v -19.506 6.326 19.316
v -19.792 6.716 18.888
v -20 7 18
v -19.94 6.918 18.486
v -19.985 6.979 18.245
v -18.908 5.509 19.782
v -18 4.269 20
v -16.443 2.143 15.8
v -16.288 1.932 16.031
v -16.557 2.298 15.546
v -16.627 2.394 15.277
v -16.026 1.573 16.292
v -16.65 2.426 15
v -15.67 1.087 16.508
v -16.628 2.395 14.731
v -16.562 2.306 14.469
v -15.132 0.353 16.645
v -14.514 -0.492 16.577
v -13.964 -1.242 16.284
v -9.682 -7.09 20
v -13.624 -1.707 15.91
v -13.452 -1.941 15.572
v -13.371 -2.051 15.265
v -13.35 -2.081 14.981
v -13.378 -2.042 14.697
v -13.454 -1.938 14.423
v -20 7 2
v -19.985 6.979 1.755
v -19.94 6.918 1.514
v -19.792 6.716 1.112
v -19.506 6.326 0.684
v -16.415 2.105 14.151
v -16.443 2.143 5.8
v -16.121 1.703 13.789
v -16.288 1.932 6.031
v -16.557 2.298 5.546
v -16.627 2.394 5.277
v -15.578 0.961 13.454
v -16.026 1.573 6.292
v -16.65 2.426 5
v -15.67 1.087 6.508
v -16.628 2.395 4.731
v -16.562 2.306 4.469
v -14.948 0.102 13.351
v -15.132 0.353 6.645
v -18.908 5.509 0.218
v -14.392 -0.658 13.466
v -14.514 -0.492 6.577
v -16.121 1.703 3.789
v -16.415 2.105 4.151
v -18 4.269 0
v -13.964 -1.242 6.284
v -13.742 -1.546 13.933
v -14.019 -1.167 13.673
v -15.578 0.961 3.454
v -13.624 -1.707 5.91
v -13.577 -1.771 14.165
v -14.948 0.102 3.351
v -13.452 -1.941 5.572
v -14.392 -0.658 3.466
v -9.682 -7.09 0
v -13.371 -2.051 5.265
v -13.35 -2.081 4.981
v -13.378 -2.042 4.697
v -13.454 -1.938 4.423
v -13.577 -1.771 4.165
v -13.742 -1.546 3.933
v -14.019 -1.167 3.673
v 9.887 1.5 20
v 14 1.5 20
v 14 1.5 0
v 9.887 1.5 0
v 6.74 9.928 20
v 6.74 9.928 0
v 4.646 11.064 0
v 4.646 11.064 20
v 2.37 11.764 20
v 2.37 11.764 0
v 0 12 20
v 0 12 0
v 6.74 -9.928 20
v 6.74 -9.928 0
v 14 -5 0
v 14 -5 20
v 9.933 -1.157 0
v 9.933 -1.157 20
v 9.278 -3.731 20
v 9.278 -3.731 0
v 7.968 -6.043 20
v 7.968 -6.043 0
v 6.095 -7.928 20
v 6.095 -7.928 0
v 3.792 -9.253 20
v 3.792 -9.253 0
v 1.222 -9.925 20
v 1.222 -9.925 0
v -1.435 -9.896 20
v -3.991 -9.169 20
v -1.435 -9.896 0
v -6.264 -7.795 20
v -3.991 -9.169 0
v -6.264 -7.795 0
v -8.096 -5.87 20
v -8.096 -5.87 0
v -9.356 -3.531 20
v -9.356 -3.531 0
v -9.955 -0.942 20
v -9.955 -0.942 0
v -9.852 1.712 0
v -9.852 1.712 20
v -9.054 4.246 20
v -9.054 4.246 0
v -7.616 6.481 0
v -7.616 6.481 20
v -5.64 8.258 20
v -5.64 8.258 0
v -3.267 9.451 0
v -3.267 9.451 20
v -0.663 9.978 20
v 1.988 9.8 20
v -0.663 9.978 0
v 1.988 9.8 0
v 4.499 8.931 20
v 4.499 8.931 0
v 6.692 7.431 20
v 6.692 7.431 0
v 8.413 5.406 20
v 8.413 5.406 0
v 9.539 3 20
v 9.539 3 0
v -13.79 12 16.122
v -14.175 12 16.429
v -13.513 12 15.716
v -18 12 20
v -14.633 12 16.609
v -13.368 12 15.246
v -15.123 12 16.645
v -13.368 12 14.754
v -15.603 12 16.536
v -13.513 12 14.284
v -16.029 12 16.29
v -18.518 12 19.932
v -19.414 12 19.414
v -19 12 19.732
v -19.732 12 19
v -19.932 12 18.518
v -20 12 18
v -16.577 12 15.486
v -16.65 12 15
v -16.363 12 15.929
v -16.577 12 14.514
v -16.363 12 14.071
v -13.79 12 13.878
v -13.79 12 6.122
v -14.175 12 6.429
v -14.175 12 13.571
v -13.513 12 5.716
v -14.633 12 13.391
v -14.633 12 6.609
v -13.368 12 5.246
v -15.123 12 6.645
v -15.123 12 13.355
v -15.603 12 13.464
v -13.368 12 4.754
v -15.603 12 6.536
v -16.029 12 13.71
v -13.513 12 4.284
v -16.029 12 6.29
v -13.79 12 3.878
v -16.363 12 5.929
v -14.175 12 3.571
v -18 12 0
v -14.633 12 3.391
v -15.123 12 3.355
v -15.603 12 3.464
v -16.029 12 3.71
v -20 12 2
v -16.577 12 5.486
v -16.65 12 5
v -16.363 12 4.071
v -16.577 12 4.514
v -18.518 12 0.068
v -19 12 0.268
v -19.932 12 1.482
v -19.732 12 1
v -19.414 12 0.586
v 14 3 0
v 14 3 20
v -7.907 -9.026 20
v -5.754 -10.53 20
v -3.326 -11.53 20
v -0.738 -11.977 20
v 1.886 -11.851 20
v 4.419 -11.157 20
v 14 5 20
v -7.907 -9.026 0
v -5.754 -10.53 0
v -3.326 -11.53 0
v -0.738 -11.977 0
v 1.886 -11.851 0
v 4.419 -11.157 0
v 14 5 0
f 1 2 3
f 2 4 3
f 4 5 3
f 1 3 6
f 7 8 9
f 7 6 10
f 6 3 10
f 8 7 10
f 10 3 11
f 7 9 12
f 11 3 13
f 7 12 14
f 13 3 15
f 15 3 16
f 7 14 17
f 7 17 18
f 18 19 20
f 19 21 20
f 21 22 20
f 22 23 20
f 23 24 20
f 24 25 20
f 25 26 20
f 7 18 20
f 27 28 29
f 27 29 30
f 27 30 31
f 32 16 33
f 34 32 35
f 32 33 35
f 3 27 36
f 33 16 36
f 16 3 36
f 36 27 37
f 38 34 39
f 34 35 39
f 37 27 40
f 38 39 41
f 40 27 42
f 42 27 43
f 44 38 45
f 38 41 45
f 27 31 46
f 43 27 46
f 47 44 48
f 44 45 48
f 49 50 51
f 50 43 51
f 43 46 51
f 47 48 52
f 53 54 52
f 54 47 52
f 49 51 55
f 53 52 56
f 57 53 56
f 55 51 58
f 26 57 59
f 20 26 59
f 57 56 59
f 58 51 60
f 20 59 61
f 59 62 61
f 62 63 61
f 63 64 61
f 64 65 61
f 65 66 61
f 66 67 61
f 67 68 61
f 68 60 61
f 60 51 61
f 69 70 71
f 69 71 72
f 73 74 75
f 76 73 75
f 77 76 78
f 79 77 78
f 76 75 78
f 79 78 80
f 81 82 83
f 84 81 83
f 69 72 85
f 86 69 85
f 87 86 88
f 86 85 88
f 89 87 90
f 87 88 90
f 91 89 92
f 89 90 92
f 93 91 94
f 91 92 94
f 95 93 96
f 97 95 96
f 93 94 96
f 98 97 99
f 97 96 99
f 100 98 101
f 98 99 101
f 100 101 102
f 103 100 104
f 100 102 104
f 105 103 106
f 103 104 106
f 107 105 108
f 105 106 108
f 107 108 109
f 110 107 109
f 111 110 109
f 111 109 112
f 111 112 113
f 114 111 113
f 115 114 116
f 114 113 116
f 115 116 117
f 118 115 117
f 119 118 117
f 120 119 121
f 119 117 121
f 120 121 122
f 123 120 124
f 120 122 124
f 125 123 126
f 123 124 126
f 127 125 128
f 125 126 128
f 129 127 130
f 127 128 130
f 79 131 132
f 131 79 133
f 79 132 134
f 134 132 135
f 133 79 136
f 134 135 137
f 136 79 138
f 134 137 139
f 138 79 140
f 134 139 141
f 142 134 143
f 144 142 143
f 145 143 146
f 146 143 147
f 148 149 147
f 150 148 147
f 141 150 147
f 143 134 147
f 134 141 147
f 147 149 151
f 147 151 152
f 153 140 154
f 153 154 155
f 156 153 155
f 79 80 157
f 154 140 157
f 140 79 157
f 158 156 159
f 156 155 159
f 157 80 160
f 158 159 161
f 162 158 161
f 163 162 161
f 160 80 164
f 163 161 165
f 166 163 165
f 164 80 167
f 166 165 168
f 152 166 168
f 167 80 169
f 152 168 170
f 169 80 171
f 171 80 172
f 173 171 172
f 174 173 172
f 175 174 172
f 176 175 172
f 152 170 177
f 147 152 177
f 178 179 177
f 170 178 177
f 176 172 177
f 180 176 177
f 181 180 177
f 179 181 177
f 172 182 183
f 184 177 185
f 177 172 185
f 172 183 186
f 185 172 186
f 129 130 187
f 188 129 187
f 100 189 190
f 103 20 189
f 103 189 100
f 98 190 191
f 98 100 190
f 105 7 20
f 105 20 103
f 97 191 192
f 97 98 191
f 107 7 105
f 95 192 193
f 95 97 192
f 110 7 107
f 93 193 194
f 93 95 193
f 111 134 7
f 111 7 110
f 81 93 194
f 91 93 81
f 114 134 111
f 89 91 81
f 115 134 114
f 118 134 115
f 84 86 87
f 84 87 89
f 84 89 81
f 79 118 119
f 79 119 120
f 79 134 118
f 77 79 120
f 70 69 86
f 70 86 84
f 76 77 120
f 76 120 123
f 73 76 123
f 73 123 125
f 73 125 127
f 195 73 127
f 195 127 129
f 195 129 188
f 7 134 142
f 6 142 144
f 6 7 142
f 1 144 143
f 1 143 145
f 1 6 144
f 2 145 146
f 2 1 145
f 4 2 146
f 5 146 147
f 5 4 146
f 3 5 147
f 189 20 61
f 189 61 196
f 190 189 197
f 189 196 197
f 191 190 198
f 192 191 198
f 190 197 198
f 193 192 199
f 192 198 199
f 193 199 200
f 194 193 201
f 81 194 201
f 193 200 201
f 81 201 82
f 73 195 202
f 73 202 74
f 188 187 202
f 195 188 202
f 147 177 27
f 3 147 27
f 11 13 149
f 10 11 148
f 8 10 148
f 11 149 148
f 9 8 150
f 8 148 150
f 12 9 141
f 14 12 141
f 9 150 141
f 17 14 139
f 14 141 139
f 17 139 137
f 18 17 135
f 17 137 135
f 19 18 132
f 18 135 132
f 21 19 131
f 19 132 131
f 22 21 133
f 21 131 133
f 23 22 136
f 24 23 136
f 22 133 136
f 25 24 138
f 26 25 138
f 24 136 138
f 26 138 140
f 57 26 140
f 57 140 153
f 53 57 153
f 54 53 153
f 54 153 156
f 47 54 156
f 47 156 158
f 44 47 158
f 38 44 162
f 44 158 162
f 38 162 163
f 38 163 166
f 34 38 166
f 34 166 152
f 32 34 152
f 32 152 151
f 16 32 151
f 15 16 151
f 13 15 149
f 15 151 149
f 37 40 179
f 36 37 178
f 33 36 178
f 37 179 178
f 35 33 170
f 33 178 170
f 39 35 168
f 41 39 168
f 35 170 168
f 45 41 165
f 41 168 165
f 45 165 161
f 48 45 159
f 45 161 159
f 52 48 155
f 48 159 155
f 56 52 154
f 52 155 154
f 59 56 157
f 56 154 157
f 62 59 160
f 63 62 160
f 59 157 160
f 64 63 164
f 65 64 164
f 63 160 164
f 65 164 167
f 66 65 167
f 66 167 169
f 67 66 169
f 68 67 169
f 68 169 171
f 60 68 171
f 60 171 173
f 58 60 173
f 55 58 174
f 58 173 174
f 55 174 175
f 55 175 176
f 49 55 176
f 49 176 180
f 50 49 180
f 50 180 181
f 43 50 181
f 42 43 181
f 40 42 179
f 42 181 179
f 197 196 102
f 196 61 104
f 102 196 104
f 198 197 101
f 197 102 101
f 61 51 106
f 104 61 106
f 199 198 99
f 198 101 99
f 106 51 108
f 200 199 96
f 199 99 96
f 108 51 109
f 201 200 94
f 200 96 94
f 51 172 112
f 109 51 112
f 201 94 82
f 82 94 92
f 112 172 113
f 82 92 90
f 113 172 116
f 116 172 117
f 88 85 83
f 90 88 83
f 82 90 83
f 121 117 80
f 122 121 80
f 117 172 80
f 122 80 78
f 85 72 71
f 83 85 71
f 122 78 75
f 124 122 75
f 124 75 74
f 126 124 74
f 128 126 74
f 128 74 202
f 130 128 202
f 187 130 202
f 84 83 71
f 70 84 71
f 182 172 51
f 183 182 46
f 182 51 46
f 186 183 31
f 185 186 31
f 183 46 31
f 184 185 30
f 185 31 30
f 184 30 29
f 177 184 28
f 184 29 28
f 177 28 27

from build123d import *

# Parameters (mm, degrees)
BOSS_EXTRU_1_DEPTH      = 20
BOSS_EXTRU_2_START      = -20
BOSS_EXTRU_2_DEPTH      = 20
ESQUISSE3_R             = 1.65
ENL_V_MAT_EXTRU_1_DEPTH = 38.094473982
CONG_1_R                = 2


with BuildPart() as part:
    # Esquisse1 → Boss.-Extru.1 (new body)
    with BuildSketch(Plane.XY):
        with BuildLine():
            Line((6.739828673, -9.928479715), (14, -5))
            Line((14, -5), (14, 1.5))
            Line((14, 1.5), (9.886859967, 1.5))
            ThreePointArc((9.886859967, 1.5), (-9.742038622, -2.256697475), (9.539392014, 3))
            Line((9.539392014, 3), (14, 3))
            Line((14, 3), (14, 5))
            Line((14, 5), (6.739828673, 9.928479715))
            ThreePointArc((6.739828673, 9.928479715), (-12, 0), (6.739828673, -9.928479715))
        make_face()
    extrude(amount=BOSS_EXTRU_1_DEPTH)

    # Esquisse2 → Boss.-Extru.2 (add)
    with BuildSketch(Plane.XY.offset(20).offset(BOSS_EXTRU_2_START)):
        with BuildLine():
            Line((0, 12), (-20, 12))
            Line((-20, 12), (-20, 7))
            Line((-20, 7), (-9.681507645, -7.090021842))
            ThreePointArc((-9.681507645, -7.090021842), (-10.702342316, 5.427694625), (0, 12))
        make_face()
    extrude(amount=BOSS_EXTRU_2_DEPTH)

    # Esquisse3 → Enlèv. mat.-Extru.1 (cut, through all)
    with BuildSketch(Plane(origin=(0, 12, 0), x_dir=(1, 0, 0), z_dir=(0, 1, 0))):
        with Locations(Location((-15, -5, 0), (0, 0, 180))):
            Circle(ESQUISSE3_R)
        with Locations(Location((-15, -15, 0), (0, 0, 180))):
            Circle(ESQUISSE3_R)
    extrude(amount=-ENL_V_MAT_EXTRU_1_DEPTH, mode=Mode.SUBTRACT)

    # Congé1
    cong_1_edges = [part.edges().sort_by_distance(p)[0] for p in [
        (-20, 9.5, 0),
        (-20, 9.5, 20),
    ]]
    fillet(cong_1_edges, radius=CONG_1_R)


solid = part.part
